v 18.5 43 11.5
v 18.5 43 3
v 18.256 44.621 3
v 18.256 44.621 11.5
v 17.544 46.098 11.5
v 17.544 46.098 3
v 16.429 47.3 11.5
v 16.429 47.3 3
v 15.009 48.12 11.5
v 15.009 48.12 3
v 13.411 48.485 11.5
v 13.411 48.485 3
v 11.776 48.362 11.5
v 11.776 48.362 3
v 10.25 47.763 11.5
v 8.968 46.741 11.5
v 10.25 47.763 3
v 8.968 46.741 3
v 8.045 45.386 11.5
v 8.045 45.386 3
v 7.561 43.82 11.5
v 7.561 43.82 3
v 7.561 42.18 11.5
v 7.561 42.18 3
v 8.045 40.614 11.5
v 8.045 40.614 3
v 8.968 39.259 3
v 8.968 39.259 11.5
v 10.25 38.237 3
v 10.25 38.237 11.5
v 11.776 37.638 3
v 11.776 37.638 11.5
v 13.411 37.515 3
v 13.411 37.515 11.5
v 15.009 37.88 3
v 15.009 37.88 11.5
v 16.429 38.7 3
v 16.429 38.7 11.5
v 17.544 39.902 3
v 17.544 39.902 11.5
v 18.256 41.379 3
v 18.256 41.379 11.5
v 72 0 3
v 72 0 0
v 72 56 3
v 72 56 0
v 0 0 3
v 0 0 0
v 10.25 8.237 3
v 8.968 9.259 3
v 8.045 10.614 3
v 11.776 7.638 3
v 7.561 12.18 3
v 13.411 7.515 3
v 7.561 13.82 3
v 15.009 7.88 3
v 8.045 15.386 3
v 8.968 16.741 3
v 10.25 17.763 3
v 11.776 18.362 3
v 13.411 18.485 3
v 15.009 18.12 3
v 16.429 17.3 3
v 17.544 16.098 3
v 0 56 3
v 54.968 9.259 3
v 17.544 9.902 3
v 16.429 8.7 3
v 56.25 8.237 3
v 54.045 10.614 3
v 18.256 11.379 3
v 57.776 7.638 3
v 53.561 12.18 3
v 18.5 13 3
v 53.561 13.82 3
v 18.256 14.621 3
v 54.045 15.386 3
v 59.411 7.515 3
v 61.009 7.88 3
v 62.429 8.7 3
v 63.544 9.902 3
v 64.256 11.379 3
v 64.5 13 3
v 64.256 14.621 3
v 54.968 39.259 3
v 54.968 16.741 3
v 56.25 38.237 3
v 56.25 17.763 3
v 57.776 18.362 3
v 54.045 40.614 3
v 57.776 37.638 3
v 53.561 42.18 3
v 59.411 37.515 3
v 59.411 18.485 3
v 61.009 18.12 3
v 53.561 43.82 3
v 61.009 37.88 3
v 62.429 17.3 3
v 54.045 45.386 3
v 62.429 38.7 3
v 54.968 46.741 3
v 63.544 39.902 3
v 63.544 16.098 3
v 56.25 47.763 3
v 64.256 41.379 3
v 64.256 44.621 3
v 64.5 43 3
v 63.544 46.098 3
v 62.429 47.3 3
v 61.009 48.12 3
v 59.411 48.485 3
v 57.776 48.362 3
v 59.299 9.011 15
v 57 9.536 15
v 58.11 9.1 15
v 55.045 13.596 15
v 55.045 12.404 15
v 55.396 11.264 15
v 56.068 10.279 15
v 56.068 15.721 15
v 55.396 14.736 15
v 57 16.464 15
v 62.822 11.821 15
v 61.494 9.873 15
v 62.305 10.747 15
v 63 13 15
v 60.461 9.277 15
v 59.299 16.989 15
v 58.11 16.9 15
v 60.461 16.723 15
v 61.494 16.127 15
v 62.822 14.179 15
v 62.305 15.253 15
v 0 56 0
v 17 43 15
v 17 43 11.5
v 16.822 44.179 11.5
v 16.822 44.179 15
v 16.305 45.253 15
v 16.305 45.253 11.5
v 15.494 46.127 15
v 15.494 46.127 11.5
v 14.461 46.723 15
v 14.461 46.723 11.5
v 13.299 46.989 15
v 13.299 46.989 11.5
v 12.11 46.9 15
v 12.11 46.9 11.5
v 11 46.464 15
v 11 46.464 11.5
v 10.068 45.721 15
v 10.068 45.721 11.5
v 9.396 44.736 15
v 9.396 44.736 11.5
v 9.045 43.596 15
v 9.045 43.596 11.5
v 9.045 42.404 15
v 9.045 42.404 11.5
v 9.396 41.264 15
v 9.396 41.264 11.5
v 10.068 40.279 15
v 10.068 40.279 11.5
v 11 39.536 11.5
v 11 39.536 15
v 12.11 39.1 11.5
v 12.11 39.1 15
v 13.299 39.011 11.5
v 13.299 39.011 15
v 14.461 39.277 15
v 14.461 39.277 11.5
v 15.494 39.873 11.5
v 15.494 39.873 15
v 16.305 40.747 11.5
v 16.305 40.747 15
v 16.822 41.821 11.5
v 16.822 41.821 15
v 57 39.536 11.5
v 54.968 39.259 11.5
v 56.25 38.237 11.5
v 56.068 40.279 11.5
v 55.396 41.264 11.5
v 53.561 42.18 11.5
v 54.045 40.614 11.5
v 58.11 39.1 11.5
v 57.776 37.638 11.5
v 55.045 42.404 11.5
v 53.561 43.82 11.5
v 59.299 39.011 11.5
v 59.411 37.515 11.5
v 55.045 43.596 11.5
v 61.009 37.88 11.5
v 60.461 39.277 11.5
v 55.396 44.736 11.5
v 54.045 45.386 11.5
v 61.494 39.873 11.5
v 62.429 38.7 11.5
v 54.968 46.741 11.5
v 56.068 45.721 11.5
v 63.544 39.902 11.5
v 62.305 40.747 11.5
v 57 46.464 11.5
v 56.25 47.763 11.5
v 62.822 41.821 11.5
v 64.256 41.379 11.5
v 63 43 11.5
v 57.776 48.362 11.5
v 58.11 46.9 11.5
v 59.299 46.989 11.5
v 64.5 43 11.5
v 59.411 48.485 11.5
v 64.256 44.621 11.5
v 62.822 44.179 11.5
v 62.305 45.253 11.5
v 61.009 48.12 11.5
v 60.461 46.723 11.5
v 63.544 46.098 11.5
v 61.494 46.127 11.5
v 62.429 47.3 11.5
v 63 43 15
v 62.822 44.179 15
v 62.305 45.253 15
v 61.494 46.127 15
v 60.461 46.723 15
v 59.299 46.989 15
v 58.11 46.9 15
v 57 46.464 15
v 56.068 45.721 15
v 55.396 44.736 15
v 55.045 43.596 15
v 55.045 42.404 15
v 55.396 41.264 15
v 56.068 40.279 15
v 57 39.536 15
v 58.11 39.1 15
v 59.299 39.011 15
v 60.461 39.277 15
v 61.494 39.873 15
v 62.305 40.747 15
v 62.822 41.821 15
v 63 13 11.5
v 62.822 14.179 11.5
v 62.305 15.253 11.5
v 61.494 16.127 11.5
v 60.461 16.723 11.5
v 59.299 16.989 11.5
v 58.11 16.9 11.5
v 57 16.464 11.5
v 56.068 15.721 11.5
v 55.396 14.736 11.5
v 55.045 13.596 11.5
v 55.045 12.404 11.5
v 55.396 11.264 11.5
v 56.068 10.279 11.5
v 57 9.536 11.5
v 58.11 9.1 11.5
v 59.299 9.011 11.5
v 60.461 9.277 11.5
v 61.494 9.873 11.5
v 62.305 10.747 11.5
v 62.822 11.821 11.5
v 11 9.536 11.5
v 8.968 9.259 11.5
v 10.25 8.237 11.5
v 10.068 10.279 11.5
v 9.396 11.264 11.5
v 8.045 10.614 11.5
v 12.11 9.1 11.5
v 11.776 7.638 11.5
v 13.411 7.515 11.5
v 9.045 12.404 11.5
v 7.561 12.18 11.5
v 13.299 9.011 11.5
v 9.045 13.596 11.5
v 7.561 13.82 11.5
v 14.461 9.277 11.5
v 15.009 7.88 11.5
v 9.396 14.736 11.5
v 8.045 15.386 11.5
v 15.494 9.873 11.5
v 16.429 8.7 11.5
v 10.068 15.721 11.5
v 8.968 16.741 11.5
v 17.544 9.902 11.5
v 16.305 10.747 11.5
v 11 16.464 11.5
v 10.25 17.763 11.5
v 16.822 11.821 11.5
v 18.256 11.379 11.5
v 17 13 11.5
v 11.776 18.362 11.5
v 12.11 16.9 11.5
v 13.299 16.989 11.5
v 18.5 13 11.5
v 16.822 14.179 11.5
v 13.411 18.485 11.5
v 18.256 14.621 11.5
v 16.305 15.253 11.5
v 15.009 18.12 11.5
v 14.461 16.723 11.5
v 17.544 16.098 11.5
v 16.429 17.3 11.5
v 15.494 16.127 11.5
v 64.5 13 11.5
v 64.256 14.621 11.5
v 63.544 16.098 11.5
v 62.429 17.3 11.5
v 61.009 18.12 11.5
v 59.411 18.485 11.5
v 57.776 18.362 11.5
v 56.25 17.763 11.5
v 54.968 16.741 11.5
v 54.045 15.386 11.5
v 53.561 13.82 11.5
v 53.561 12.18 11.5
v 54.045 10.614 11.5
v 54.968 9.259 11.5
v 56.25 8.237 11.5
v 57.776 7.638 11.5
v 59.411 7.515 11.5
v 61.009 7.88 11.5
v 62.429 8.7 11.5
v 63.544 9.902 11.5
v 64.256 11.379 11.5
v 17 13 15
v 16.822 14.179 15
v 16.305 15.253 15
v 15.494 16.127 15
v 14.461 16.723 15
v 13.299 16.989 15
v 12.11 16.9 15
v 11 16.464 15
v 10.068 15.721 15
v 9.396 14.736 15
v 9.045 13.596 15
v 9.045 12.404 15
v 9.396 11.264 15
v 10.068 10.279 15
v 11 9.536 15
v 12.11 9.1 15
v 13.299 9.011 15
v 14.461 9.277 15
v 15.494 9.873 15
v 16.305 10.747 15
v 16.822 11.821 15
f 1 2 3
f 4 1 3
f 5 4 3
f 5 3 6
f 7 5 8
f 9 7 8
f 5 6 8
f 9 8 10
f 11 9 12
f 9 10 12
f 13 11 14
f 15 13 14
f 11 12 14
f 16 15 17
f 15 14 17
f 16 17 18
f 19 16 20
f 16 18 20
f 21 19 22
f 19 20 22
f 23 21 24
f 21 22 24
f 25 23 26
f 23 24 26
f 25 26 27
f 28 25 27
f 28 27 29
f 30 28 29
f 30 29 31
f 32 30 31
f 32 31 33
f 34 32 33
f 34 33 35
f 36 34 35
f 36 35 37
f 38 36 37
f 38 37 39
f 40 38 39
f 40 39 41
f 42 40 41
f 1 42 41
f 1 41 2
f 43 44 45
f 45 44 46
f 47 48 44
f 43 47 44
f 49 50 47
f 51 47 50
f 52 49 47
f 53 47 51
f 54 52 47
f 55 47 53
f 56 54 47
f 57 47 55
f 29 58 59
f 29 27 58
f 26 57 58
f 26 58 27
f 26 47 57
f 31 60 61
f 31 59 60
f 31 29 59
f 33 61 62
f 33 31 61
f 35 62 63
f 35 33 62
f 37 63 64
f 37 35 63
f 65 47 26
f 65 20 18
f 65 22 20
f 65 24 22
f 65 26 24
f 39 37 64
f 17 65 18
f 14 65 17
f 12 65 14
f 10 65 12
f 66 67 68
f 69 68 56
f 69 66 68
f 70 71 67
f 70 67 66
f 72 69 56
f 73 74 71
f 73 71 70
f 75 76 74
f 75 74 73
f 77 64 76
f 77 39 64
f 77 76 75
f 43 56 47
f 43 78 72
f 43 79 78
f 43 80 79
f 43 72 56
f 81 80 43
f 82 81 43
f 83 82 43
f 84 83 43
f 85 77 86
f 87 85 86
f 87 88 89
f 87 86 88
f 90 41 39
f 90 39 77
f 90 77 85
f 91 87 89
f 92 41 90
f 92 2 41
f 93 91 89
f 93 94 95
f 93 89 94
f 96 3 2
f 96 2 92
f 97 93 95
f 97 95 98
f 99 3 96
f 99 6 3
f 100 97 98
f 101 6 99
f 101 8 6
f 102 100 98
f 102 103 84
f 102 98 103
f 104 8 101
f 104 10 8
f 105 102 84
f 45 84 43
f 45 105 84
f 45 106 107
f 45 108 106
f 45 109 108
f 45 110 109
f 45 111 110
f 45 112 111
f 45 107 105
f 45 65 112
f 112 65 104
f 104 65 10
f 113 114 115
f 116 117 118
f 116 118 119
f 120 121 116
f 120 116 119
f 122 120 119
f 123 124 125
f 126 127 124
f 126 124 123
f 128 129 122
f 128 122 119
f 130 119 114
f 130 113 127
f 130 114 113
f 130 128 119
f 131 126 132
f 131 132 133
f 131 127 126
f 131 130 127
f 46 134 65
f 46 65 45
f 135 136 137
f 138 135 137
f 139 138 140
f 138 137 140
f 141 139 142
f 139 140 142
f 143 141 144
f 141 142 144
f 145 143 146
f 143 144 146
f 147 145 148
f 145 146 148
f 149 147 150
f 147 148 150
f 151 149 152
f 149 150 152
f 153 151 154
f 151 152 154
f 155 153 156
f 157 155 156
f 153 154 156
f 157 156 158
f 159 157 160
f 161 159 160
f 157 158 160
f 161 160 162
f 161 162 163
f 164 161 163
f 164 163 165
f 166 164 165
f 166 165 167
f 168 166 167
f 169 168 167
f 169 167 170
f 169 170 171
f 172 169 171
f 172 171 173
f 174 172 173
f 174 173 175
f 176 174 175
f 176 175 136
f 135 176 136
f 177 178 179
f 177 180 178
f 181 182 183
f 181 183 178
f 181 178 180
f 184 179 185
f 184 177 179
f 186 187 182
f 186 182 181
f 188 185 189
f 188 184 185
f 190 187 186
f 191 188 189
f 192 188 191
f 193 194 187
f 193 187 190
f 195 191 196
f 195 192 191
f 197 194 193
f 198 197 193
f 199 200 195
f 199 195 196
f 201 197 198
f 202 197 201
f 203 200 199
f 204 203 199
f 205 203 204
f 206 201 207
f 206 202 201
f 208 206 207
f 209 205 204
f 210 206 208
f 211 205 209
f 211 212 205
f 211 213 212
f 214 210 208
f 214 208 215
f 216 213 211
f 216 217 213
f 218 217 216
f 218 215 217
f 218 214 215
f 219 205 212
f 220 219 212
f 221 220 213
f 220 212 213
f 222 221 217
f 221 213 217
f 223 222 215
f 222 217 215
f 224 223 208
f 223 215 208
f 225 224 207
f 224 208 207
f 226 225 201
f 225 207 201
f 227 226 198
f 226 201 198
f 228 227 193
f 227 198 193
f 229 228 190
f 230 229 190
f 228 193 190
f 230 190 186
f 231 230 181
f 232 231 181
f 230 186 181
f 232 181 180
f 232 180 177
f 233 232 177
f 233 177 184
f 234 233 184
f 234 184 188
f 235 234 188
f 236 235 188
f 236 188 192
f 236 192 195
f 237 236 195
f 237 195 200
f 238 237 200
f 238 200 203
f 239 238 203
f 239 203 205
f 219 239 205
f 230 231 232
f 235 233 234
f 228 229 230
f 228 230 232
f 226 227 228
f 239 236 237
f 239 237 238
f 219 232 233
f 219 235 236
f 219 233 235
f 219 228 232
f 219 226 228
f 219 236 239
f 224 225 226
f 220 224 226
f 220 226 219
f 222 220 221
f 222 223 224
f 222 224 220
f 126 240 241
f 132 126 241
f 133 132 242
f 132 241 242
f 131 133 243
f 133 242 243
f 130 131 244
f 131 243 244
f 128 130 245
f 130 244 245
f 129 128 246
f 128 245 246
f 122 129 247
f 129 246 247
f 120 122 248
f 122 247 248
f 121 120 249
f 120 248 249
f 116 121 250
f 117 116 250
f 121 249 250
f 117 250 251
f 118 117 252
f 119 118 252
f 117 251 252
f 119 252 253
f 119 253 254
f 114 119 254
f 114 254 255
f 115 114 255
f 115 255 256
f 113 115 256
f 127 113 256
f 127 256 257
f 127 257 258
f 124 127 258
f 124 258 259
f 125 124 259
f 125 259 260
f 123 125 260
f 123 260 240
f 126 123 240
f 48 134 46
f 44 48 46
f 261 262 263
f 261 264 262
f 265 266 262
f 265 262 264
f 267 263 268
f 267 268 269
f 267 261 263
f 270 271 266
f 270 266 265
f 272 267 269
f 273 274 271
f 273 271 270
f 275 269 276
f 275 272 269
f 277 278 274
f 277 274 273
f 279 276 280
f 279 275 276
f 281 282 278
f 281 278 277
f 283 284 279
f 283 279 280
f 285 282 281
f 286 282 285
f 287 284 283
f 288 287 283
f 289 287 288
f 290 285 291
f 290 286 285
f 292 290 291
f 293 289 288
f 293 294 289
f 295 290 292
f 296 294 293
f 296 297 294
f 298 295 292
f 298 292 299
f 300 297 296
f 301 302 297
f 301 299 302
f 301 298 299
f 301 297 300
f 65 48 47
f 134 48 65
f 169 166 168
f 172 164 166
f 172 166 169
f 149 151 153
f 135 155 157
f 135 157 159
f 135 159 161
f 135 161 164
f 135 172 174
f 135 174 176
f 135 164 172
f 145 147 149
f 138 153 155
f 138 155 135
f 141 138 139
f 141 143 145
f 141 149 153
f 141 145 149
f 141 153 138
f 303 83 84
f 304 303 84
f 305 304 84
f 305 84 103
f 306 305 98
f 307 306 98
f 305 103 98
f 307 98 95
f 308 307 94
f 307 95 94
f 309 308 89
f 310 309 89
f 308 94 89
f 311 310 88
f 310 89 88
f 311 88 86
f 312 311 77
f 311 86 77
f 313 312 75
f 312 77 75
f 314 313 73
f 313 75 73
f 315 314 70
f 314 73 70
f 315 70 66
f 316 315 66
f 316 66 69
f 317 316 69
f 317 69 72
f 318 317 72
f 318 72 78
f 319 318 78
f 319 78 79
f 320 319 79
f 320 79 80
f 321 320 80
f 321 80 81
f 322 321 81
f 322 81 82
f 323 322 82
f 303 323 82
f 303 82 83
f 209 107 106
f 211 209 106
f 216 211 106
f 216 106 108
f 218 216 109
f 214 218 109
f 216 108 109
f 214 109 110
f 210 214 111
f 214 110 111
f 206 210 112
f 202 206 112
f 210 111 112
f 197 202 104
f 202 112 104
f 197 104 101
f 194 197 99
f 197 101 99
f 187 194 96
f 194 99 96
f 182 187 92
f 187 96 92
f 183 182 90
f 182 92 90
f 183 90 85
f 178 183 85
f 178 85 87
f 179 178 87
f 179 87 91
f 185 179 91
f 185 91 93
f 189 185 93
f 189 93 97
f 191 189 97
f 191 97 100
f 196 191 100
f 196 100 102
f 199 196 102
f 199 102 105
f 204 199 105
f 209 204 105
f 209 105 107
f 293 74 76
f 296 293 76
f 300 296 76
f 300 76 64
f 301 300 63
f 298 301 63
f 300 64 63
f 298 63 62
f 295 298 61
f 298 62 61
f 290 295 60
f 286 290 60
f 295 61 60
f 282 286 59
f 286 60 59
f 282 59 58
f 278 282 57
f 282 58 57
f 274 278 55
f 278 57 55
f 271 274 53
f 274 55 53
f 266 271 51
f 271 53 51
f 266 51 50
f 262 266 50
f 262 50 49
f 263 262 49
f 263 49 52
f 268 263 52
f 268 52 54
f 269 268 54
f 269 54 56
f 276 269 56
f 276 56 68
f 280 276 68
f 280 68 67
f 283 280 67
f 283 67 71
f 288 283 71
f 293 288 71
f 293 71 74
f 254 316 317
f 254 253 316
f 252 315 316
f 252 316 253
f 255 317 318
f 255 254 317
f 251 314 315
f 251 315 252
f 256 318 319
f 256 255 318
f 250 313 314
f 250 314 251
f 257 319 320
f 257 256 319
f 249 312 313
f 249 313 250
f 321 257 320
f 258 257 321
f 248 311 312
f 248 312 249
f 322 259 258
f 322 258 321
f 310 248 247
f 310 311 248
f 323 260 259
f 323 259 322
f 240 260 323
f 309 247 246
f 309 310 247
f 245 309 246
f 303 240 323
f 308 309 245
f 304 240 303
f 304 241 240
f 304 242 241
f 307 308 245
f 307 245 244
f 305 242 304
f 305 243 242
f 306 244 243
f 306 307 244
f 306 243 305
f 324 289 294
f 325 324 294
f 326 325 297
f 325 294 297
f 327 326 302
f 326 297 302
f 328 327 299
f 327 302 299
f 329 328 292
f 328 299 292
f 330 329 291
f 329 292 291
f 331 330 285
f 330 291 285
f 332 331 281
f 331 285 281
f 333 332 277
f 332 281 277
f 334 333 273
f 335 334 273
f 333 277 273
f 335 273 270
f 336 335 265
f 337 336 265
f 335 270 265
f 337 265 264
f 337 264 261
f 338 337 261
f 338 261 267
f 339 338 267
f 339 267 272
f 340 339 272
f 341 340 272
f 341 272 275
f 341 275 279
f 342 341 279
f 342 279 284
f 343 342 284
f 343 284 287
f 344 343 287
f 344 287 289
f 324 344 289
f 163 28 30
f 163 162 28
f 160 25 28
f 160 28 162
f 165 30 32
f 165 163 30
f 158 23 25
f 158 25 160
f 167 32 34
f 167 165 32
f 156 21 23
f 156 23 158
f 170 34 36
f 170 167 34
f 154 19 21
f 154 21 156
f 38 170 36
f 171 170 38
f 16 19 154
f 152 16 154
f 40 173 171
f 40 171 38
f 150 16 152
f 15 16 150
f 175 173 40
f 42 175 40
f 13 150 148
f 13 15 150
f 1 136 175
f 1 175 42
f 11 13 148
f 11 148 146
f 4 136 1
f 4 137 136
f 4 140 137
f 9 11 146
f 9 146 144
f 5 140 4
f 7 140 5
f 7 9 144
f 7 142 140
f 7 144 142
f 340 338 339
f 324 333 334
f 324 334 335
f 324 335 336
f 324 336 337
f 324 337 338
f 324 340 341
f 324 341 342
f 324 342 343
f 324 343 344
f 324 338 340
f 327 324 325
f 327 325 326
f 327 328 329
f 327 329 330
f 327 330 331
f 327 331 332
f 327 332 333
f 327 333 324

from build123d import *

# Parameters (mm, degrees)
F0_W     = 72
F0_H     = 56
F0_R     = 5.5
F1_DEPTH = 3
F0_R_2   = 4
F2_DEPTH = 11.5
F3_DEPTH = 15


with BuildPart() as f1:
    # F0 (on Top) → F1 (new body)
    with BuildSketch(Plane.XY):
        with Locations((36, 28)):
            Rectangle(F0_W, F0_H)
        with Locations((13, 13)):
            Circle(F0_R, mode=Mode.SUBTRACT)
        with Locations((59, 13)):
            Circle(F0_R, mode=Mode.SUBTRACT)
        with Locations((13, 43)):
            Circle(F0_R, mode=Mode.SUBTRACT)
        with Locations((59, 43)):
            Circle(F0_R, mode=Mode.SUBTRACT)
    extrude(amount=F1_DEPTH)

    # F0 (on Top) → F2 (join)
    with BuildSketch(Plane.XY):
        with Locations((59, 13)):
            Circle(F0_R)
        with Locations((59, 13)):
            Circle(F0_R_2, mode=Mode.SUBTRACT)
        with Locations((59, 43)):
            Circle(F0_R)
        with Locations((59, 43)):
            Circle(F0_R_2, mode=Mode.SUBTRACT)
        with Locations((13, 43)):
            Circle(F0_R)
        with Locations((13, 43)):
            Circle(F0_R_2, mode=Mode.SUBTRACT)
        with Locations((13, 13)):
            Circle(F0_R)
        with Locations((13, 13)):
            Circle(F0_R_2, mode=Mode.SUBTRACT)
    extrude(amount=F2_DEPTH)

    # F0 (on Top) → F3 (join)
    with BuildSketch(Plane.XY):
        with Locations((13, 43)):
            Circle(F0_R_2)
        with Locations((59, 43)):
            Circle(F0_R_2)
        with Locations((59, 13)):
            Circle(F0_R_2)
        with Locations((13, 13)):
            Circle(F0_R_2)
    extrude(amount=F3_DEPTH)


solid = f1.part
